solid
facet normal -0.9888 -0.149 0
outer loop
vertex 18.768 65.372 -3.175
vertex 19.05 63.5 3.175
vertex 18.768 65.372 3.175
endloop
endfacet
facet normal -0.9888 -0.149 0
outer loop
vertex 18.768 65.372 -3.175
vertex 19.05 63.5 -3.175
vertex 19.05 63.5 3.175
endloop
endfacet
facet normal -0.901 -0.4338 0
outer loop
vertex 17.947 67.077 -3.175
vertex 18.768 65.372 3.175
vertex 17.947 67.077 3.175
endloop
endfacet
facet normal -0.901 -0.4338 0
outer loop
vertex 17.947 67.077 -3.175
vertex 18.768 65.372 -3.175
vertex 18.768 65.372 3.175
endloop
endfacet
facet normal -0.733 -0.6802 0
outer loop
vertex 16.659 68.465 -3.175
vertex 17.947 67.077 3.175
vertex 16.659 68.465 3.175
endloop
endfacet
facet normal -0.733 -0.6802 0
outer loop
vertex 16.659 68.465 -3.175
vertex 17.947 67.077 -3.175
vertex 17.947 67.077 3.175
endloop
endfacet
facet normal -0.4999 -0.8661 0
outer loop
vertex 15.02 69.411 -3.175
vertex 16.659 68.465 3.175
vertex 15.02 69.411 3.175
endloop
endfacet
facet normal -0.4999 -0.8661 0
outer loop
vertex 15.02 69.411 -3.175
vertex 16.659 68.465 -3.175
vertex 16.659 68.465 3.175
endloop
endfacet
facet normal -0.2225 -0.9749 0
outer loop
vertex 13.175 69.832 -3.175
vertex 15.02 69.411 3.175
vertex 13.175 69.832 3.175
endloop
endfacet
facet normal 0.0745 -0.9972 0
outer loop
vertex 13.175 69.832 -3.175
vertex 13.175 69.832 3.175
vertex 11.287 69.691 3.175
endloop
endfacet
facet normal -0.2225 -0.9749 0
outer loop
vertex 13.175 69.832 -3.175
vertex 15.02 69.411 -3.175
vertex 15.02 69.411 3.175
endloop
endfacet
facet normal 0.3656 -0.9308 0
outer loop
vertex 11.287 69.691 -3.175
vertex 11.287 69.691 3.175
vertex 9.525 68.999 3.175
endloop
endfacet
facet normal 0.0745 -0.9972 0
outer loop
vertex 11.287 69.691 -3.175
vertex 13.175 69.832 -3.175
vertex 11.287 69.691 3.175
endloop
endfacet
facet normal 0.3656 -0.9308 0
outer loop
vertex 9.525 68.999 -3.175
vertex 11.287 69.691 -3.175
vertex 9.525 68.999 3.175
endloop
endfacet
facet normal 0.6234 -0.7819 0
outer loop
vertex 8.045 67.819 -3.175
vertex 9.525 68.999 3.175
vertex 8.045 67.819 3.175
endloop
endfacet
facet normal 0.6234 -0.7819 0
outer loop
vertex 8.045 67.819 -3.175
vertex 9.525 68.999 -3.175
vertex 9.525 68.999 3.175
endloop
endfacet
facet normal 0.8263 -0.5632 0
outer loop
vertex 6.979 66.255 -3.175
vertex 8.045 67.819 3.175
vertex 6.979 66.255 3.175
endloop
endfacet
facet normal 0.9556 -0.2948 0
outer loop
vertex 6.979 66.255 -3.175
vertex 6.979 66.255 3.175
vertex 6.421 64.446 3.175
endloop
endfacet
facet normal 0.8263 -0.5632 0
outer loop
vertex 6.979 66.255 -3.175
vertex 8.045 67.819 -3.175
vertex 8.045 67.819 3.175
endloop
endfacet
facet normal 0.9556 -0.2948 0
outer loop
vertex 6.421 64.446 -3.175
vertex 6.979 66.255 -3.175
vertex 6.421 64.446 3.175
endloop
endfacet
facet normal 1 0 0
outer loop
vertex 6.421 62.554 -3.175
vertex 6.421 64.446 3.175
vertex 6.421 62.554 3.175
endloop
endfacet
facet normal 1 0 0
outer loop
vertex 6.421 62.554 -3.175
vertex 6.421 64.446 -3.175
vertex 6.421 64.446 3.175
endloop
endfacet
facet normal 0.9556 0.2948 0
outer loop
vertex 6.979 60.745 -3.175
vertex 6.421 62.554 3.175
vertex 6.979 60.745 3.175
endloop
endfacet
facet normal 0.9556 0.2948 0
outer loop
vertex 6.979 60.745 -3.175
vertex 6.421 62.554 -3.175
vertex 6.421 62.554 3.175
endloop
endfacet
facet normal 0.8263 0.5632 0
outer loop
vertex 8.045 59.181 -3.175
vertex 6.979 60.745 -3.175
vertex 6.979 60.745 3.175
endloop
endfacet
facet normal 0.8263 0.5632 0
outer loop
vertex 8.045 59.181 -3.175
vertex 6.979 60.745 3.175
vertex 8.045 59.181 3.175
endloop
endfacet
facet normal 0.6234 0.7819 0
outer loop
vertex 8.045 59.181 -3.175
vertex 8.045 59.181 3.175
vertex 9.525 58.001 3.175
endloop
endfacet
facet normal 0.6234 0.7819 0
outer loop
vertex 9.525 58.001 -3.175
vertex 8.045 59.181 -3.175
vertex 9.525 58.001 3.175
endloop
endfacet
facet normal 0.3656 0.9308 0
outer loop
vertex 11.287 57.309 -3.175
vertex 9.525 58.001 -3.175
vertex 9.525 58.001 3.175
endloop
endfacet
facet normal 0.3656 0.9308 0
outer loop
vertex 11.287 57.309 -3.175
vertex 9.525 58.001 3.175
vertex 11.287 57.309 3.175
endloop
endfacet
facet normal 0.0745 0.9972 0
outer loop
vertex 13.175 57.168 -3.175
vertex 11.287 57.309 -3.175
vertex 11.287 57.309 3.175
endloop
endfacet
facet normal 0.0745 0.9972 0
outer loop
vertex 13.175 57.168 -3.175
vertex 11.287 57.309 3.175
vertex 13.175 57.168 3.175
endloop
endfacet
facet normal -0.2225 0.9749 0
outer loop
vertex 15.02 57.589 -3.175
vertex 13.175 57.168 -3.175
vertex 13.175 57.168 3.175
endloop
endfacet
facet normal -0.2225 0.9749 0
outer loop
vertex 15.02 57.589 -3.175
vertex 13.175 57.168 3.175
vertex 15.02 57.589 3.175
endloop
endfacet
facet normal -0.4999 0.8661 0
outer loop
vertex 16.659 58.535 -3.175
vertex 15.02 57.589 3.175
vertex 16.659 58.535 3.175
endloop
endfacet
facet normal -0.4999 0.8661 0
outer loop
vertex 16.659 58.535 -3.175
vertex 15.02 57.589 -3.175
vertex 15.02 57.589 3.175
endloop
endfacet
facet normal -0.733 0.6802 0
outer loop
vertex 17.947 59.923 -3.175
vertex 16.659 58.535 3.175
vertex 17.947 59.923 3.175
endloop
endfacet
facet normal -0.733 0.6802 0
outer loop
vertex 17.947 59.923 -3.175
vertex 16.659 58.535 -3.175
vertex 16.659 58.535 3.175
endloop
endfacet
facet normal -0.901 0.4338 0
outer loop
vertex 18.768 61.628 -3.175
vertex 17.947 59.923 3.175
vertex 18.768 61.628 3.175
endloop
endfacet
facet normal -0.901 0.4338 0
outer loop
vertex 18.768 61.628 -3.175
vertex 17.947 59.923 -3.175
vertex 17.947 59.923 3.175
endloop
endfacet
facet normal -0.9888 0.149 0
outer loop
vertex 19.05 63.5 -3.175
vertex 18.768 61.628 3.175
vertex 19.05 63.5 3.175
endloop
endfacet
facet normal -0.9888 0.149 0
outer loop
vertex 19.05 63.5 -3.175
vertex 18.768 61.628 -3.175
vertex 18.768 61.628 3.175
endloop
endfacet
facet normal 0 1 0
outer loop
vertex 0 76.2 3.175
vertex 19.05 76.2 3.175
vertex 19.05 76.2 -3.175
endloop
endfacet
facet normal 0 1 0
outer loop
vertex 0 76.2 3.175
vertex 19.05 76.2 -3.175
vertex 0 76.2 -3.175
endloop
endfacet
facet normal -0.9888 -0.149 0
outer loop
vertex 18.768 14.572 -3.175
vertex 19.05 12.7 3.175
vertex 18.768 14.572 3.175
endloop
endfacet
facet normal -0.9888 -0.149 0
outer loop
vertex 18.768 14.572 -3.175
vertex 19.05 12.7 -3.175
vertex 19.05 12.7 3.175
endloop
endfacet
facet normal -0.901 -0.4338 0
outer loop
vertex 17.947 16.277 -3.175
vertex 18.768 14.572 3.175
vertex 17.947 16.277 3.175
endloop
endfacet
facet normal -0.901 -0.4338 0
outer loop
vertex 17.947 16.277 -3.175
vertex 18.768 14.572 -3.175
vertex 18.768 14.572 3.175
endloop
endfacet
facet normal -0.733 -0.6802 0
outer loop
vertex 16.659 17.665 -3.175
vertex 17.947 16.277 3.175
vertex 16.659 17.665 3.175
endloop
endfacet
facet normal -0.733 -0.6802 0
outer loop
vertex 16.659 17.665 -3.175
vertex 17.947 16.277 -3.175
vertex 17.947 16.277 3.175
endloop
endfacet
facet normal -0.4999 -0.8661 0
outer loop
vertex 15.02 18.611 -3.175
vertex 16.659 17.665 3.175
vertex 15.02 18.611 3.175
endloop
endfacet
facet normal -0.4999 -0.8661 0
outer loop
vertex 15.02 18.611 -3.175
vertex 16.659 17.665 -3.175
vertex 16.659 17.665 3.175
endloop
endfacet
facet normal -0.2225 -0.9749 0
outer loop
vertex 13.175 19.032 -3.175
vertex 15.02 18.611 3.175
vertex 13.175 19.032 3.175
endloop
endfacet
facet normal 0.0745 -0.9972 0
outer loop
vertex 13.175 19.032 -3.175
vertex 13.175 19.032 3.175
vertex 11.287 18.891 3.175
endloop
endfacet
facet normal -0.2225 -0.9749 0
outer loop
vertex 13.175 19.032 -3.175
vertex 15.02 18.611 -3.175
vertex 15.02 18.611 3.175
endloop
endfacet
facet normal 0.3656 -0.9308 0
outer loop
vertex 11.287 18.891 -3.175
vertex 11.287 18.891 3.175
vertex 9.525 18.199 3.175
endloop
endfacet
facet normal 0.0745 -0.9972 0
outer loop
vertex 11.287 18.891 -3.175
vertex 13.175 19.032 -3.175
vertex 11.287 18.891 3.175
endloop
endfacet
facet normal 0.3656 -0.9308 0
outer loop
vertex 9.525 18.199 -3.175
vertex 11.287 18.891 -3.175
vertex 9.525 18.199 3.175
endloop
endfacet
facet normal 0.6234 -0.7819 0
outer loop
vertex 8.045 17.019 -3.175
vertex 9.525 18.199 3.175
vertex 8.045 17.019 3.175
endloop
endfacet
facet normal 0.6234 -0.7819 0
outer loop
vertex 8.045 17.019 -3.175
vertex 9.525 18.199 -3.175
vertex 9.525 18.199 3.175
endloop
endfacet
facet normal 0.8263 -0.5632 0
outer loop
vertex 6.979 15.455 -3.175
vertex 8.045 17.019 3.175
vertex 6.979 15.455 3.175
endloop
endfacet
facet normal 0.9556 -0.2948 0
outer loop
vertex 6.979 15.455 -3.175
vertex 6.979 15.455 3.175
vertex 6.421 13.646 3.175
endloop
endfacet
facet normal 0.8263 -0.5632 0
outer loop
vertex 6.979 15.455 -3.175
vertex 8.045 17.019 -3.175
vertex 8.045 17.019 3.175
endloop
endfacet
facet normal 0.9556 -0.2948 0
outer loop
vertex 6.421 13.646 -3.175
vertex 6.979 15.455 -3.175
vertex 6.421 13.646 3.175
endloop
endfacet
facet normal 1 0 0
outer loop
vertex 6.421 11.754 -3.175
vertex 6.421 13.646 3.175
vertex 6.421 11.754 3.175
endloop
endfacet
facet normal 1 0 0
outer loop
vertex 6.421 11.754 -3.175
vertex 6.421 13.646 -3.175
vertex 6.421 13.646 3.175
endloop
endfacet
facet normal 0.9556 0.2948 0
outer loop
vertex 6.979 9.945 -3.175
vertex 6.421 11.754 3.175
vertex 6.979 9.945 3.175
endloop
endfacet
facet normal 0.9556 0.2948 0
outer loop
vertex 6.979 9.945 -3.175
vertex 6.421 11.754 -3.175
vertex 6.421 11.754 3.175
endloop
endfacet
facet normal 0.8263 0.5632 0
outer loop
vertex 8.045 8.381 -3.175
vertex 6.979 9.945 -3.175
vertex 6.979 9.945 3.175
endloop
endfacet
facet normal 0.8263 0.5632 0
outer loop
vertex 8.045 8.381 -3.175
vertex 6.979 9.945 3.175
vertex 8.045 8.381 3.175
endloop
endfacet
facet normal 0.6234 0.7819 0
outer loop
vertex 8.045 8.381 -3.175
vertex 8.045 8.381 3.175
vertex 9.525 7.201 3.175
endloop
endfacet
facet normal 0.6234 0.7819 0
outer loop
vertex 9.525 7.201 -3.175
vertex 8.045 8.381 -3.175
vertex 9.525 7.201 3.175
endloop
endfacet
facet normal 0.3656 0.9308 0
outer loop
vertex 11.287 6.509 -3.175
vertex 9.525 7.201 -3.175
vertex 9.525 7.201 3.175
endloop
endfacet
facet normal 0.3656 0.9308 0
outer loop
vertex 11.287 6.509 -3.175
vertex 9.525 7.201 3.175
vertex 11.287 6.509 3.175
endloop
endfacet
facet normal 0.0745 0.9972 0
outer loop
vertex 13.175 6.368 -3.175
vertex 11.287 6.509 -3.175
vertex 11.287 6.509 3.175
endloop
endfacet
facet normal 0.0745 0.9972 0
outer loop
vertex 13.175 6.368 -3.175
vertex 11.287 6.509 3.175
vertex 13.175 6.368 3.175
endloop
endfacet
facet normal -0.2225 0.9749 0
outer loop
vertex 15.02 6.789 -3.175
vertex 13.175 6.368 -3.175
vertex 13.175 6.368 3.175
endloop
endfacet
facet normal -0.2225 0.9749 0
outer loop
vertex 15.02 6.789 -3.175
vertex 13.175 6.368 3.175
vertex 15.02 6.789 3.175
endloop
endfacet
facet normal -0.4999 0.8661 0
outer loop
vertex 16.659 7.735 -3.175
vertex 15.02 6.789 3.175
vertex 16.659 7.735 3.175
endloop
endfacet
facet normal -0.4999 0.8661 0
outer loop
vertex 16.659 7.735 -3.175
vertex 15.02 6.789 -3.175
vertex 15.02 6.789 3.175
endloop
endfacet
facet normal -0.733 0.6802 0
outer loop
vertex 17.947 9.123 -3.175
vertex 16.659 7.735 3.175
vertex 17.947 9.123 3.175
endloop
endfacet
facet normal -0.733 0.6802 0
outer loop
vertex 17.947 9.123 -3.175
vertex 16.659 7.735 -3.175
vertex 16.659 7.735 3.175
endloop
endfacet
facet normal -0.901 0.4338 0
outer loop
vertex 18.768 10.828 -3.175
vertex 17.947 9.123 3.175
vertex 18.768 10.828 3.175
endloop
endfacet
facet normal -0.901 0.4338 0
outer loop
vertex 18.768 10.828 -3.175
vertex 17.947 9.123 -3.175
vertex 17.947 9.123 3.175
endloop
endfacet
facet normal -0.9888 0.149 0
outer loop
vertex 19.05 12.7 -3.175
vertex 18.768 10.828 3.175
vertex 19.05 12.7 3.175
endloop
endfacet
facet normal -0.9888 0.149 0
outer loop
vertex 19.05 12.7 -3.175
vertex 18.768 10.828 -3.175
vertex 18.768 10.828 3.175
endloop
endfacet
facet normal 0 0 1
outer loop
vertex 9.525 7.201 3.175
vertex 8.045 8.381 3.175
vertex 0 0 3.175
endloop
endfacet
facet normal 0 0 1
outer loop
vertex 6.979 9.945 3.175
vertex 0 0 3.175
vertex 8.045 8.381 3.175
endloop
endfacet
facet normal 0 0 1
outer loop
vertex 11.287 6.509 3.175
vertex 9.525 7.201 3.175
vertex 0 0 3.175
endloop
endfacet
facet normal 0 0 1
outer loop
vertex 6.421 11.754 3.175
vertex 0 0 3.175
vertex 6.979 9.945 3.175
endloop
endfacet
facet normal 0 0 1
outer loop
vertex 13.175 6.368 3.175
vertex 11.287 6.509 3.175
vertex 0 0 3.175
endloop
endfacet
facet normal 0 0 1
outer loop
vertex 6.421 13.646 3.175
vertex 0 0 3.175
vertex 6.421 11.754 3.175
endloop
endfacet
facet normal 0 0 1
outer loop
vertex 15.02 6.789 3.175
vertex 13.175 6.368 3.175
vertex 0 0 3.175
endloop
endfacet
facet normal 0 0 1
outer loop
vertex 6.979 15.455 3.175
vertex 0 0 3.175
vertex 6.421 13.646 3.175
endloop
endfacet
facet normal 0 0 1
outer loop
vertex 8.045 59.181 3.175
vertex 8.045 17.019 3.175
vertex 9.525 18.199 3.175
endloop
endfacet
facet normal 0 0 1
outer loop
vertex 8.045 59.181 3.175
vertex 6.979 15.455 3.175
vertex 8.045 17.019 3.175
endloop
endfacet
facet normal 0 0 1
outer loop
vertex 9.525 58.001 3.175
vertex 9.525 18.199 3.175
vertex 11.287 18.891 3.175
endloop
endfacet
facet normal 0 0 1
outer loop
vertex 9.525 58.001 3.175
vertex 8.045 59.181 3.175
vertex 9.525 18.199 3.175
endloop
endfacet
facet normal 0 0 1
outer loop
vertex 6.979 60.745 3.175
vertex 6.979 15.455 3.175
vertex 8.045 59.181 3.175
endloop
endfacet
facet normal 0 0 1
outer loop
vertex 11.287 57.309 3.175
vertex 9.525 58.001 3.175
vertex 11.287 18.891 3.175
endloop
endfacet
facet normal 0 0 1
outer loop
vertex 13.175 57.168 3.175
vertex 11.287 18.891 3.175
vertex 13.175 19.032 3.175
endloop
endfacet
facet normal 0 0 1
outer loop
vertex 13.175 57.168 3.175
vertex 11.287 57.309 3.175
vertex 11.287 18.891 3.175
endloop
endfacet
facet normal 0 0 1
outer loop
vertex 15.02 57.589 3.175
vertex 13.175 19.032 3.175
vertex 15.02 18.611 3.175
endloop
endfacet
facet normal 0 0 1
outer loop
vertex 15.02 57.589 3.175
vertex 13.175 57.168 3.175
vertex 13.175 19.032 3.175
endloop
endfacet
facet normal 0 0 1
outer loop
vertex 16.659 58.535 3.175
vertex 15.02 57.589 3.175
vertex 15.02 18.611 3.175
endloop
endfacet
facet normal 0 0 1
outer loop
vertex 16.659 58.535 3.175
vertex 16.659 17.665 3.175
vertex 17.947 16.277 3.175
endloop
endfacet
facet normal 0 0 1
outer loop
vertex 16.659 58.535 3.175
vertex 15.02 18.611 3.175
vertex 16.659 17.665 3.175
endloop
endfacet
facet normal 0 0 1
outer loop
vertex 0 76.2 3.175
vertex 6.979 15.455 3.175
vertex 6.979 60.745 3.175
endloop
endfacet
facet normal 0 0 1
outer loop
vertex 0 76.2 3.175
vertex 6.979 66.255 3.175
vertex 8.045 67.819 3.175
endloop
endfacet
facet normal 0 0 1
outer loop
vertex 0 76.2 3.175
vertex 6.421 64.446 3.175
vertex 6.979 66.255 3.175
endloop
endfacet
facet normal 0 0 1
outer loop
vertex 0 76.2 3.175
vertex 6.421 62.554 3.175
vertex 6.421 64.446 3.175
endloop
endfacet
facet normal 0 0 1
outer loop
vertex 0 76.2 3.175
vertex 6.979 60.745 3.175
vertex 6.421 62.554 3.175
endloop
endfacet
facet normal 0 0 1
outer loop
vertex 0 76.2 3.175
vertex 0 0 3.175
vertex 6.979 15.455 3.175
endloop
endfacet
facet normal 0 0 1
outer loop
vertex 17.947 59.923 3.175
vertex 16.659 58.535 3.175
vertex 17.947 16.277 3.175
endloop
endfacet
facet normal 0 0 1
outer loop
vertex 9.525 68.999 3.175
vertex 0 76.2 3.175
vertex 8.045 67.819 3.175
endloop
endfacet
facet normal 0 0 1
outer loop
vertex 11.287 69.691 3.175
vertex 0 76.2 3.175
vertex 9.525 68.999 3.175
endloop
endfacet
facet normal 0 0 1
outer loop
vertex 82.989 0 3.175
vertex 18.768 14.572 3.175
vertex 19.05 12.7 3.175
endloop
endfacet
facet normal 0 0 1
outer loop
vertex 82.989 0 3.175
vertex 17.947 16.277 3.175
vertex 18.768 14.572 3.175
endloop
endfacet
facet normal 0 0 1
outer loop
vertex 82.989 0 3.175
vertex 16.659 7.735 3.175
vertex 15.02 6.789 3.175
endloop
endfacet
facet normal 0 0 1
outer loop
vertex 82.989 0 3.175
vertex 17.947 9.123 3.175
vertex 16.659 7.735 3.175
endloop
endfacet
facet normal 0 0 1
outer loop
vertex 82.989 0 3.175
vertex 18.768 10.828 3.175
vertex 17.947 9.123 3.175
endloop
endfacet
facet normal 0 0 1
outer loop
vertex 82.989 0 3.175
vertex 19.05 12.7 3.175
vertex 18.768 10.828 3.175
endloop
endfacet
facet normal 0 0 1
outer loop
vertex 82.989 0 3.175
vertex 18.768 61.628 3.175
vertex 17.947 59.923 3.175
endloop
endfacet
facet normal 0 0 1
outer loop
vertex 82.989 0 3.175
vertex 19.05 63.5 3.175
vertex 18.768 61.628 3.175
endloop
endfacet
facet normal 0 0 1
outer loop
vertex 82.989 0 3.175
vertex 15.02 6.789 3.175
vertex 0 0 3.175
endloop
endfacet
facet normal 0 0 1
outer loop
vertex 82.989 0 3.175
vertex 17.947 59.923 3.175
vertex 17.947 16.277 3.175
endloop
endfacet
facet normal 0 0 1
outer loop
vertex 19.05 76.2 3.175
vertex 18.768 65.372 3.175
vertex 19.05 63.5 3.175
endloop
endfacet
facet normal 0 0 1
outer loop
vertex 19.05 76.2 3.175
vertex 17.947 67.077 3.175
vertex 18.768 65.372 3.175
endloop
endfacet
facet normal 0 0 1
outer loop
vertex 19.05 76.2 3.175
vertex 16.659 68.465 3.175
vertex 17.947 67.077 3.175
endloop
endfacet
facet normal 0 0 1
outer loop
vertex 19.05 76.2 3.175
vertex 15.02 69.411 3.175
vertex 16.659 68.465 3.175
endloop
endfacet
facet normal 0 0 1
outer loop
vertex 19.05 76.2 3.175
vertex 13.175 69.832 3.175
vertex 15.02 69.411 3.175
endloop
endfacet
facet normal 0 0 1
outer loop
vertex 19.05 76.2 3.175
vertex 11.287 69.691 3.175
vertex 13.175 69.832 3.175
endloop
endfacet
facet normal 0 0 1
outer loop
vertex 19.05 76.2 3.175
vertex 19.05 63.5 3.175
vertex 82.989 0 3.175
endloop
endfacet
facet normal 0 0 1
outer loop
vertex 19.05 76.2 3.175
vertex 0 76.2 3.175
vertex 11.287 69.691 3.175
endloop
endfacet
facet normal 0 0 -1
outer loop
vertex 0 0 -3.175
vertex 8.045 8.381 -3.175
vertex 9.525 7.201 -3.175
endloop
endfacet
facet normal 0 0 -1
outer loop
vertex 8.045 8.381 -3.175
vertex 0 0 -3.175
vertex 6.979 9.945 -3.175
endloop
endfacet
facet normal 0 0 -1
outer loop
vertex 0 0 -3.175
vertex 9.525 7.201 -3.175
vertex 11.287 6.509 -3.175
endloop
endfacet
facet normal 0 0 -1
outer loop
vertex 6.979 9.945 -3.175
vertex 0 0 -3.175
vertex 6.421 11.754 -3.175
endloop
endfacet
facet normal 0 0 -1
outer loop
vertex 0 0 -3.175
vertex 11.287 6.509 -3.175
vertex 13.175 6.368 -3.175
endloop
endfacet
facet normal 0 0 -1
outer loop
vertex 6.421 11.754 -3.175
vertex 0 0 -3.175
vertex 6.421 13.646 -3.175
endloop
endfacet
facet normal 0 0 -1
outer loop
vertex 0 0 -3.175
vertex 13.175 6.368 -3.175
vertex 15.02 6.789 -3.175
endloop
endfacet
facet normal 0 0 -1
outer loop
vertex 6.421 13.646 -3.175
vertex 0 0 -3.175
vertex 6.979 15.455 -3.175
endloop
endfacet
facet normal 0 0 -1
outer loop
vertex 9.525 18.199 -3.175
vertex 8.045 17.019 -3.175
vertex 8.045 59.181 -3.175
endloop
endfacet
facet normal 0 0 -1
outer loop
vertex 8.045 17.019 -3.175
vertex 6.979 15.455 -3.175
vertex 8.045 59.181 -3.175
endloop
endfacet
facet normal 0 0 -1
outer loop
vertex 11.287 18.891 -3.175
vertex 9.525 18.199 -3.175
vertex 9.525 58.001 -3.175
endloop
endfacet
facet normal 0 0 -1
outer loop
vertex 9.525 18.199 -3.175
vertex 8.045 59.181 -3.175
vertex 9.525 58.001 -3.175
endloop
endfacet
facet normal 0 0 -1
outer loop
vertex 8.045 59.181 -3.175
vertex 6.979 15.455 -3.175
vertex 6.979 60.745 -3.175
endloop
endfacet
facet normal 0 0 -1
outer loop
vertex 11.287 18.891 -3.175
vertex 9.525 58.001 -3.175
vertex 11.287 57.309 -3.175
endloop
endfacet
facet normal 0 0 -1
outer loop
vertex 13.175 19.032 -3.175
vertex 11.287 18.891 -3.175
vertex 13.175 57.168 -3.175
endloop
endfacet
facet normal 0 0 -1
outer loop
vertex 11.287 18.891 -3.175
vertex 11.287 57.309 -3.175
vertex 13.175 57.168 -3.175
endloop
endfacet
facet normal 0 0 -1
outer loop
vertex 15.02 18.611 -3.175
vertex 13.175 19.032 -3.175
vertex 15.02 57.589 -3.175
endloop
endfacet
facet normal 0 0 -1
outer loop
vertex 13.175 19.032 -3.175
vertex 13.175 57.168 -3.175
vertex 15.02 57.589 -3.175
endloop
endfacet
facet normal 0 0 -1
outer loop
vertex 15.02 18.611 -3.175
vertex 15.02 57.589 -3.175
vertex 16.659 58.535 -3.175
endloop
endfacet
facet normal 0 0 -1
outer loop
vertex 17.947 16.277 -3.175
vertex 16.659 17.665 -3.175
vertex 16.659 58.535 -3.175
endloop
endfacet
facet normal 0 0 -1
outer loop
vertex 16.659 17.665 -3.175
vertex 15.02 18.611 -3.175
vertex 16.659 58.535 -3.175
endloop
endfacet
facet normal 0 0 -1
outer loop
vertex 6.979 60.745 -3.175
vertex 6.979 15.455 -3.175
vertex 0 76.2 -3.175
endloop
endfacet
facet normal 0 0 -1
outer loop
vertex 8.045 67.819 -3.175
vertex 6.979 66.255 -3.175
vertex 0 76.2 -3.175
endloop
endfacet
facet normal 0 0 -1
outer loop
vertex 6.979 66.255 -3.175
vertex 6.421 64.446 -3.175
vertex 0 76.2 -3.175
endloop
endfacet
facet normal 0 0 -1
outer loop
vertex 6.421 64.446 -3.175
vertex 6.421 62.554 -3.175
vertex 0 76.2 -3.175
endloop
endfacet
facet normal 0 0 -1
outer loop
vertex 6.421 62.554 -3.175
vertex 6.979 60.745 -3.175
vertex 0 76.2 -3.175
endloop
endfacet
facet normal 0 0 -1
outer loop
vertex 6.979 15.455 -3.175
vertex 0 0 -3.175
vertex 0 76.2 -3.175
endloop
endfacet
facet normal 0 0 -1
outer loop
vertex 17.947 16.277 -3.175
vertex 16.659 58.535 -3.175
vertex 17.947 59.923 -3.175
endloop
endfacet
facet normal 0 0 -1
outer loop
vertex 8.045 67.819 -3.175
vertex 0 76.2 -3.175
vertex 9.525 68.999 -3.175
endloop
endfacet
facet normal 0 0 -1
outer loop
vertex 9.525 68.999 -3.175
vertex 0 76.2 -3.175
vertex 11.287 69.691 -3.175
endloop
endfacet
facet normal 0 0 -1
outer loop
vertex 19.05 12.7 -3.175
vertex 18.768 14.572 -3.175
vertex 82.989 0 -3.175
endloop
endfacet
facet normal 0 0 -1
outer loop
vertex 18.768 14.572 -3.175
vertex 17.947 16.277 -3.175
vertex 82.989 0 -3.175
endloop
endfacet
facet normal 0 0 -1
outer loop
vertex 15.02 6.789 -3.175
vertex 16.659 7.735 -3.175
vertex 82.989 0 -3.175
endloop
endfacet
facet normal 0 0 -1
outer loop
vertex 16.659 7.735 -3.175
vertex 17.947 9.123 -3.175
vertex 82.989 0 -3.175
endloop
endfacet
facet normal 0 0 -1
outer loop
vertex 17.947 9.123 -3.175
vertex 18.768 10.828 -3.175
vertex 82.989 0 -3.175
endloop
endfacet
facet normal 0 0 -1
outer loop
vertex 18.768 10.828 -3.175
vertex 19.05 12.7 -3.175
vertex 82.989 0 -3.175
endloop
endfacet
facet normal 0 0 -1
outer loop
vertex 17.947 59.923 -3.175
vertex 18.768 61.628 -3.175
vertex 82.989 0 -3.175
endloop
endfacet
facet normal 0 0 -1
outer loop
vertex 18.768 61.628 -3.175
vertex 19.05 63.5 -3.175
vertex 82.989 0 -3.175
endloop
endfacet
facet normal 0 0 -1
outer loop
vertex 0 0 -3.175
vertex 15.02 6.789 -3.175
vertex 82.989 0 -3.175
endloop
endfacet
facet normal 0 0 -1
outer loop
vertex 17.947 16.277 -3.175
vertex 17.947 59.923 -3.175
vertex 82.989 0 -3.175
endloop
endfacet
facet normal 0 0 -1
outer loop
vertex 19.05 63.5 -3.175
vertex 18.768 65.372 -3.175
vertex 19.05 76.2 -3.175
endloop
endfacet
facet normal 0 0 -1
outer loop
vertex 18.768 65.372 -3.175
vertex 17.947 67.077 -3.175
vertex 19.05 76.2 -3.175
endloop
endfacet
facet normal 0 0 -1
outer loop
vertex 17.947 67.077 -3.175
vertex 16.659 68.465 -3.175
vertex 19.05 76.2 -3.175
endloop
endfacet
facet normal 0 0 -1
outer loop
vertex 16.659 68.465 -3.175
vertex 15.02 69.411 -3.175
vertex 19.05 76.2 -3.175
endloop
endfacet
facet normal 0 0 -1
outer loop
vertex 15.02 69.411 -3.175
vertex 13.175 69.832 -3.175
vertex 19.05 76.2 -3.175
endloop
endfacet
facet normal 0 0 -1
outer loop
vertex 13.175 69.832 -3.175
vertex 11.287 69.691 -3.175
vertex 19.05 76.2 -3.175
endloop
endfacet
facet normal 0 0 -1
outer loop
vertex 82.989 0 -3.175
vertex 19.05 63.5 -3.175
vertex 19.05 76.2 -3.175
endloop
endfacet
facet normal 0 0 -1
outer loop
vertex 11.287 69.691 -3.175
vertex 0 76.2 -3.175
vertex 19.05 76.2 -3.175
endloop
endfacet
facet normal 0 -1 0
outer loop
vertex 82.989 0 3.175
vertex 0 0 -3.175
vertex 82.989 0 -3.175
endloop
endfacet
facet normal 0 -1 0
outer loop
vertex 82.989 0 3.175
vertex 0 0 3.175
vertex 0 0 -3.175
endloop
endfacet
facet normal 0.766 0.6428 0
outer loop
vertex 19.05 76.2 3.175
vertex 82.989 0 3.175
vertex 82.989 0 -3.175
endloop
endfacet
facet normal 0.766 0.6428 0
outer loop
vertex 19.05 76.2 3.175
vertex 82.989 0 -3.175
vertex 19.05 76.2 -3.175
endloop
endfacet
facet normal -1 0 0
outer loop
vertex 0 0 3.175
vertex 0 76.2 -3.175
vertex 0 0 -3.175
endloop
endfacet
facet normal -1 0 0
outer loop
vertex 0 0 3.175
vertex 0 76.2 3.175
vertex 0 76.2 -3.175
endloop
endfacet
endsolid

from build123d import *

# Parameters (mm, degrees)
SKETCH1_R           = 6.35
BOSS_EXTRUDE1_DEPTH = 3.175


with BuildPart() as part:
    # Sketch1 → Boss-Extrude1 (new body, symmetric)
    with BuildSketch(Plane.XY):
        Polygon((0, 0), (82.989391896, 0), (19.05, 76.2), (0, 76.2), align=None)
        with Locations((12.7, 63.5)):
            Circle(SKETCH1_R, mode=Mode.SUBTRACT)
        with Locations((12.7, 12.7)):
            Circle(SKETCH1_R, mode=Mode.SUBTRACT)
    extrude(amount=BOSS_EXTRUDE1_DEPTH, both=True)


solid = part.part
